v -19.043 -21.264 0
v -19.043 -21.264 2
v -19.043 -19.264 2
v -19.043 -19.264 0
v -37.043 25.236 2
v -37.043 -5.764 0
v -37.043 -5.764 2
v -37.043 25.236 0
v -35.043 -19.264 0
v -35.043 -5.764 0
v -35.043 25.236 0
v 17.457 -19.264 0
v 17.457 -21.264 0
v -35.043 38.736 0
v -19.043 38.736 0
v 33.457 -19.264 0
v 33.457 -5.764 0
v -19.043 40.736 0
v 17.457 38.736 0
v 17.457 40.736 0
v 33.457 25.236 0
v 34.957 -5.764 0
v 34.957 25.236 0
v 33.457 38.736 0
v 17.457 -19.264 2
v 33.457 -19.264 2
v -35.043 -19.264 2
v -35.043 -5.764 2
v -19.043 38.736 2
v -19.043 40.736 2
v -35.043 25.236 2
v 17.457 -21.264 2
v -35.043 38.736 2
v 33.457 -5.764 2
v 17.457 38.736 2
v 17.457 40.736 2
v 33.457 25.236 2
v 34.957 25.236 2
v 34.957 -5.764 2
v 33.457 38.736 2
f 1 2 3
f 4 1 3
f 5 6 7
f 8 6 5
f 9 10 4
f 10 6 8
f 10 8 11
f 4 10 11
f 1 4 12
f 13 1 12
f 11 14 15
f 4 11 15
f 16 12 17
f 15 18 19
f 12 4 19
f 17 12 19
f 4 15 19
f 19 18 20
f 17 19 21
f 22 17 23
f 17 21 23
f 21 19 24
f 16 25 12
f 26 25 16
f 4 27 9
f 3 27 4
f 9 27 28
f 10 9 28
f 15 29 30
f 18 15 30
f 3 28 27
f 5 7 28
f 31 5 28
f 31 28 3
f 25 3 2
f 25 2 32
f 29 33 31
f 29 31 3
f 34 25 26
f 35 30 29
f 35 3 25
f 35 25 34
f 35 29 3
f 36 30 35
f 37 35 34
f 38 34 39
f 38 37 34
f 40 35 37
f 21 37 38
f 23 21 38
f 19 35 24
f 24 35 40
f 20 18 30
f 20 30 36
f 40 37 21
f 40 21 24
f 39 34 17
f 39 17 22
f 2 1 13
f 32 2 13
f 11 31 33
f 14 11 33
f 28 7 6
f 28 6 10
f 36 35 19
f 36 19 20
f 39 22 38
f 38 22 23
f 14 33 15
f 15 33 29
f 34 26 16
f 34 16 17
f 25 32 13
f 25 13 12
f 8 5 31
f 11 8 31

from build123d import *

# Parameters (mm, degrees)
SKETCH_1_W          = 72
SKETCH_1_H          = 62
EXTRUDE_1_DEPTH     = 2
SKETCH_2_W          = 2
SKETCH_2_H          = 15.5
CUT_EXTRUDE_1_DEPTH = 3
SKETCH_3_W          = 18
SKETCH_3_H          = 2
CUT_EXTRUDE_2_DEPTH = 3


with BuildPart() as part:
    # ｽｹｯﾁ1 → ﾎﾞｽ - 押し出し1 (new body)
    with BuildSketch(Plane.XY):
        with Locations((-1.042641223, 9.736263736)):
            Rectangle(SKETCH_1_W, SKETCH_1_H)
    extrude(amount=EXTRUDE_1_DEPTH)

    # ｽｹｯﾁ2 → ｶｯﾄ - 押し出し1 (cut, through all)
    with BuildSketch(Plane.XY.offset(2)):
        with Locations((34.457358777, -13.513736264)):
            Rectangle(SKETCH_2_W, SKETCH_2_H)
        with Locations((34.457358777, 32.986263736)):
            Rectangle(SKETCH_2_W, SKETCH_2_H)
        with Locations((-36.042641223, 32.986263736)):
            Rectangle(SKETCH_2_W, SKETCH_2_H)
        with Locations((-36.042641223, -13.513736264)):
            Rectangle(SKETCH_2_W, SKETCH_2_H)
    extrude(amount=-CUT_EXTRUDE_1_DEPTH, mode=Mode.SUBTRACT)

    # ｽｹｯﾁ3 → ｶｯﾄ - 押し出し2 (cut, through all)
    with BuildSketch(Plane.XY.offset(2)):
        with Locations((-28.042641223, 39.736263736)):
            Rectangle(SKETCH_3_W, SKETCH_3_H)
        with Locations((26.457358777, 39.736263736)):
            Rectangle(SKETCH_3_W, SKETCH_3_H)
        with Locations((-28.042641223, -20.263736264)):
            Rectangle(SKETCH_3_W, SKETCH_3_H)
        with Locations((26.457358777, -20.263736264)):
            Rectangle(SKETCH_3_W, SKETCH_3_H)
    extrude(amount=-CUT_EXTRUDE_2_DEPTH, mode=Mode.SUBTRACT)


solid = part.part
